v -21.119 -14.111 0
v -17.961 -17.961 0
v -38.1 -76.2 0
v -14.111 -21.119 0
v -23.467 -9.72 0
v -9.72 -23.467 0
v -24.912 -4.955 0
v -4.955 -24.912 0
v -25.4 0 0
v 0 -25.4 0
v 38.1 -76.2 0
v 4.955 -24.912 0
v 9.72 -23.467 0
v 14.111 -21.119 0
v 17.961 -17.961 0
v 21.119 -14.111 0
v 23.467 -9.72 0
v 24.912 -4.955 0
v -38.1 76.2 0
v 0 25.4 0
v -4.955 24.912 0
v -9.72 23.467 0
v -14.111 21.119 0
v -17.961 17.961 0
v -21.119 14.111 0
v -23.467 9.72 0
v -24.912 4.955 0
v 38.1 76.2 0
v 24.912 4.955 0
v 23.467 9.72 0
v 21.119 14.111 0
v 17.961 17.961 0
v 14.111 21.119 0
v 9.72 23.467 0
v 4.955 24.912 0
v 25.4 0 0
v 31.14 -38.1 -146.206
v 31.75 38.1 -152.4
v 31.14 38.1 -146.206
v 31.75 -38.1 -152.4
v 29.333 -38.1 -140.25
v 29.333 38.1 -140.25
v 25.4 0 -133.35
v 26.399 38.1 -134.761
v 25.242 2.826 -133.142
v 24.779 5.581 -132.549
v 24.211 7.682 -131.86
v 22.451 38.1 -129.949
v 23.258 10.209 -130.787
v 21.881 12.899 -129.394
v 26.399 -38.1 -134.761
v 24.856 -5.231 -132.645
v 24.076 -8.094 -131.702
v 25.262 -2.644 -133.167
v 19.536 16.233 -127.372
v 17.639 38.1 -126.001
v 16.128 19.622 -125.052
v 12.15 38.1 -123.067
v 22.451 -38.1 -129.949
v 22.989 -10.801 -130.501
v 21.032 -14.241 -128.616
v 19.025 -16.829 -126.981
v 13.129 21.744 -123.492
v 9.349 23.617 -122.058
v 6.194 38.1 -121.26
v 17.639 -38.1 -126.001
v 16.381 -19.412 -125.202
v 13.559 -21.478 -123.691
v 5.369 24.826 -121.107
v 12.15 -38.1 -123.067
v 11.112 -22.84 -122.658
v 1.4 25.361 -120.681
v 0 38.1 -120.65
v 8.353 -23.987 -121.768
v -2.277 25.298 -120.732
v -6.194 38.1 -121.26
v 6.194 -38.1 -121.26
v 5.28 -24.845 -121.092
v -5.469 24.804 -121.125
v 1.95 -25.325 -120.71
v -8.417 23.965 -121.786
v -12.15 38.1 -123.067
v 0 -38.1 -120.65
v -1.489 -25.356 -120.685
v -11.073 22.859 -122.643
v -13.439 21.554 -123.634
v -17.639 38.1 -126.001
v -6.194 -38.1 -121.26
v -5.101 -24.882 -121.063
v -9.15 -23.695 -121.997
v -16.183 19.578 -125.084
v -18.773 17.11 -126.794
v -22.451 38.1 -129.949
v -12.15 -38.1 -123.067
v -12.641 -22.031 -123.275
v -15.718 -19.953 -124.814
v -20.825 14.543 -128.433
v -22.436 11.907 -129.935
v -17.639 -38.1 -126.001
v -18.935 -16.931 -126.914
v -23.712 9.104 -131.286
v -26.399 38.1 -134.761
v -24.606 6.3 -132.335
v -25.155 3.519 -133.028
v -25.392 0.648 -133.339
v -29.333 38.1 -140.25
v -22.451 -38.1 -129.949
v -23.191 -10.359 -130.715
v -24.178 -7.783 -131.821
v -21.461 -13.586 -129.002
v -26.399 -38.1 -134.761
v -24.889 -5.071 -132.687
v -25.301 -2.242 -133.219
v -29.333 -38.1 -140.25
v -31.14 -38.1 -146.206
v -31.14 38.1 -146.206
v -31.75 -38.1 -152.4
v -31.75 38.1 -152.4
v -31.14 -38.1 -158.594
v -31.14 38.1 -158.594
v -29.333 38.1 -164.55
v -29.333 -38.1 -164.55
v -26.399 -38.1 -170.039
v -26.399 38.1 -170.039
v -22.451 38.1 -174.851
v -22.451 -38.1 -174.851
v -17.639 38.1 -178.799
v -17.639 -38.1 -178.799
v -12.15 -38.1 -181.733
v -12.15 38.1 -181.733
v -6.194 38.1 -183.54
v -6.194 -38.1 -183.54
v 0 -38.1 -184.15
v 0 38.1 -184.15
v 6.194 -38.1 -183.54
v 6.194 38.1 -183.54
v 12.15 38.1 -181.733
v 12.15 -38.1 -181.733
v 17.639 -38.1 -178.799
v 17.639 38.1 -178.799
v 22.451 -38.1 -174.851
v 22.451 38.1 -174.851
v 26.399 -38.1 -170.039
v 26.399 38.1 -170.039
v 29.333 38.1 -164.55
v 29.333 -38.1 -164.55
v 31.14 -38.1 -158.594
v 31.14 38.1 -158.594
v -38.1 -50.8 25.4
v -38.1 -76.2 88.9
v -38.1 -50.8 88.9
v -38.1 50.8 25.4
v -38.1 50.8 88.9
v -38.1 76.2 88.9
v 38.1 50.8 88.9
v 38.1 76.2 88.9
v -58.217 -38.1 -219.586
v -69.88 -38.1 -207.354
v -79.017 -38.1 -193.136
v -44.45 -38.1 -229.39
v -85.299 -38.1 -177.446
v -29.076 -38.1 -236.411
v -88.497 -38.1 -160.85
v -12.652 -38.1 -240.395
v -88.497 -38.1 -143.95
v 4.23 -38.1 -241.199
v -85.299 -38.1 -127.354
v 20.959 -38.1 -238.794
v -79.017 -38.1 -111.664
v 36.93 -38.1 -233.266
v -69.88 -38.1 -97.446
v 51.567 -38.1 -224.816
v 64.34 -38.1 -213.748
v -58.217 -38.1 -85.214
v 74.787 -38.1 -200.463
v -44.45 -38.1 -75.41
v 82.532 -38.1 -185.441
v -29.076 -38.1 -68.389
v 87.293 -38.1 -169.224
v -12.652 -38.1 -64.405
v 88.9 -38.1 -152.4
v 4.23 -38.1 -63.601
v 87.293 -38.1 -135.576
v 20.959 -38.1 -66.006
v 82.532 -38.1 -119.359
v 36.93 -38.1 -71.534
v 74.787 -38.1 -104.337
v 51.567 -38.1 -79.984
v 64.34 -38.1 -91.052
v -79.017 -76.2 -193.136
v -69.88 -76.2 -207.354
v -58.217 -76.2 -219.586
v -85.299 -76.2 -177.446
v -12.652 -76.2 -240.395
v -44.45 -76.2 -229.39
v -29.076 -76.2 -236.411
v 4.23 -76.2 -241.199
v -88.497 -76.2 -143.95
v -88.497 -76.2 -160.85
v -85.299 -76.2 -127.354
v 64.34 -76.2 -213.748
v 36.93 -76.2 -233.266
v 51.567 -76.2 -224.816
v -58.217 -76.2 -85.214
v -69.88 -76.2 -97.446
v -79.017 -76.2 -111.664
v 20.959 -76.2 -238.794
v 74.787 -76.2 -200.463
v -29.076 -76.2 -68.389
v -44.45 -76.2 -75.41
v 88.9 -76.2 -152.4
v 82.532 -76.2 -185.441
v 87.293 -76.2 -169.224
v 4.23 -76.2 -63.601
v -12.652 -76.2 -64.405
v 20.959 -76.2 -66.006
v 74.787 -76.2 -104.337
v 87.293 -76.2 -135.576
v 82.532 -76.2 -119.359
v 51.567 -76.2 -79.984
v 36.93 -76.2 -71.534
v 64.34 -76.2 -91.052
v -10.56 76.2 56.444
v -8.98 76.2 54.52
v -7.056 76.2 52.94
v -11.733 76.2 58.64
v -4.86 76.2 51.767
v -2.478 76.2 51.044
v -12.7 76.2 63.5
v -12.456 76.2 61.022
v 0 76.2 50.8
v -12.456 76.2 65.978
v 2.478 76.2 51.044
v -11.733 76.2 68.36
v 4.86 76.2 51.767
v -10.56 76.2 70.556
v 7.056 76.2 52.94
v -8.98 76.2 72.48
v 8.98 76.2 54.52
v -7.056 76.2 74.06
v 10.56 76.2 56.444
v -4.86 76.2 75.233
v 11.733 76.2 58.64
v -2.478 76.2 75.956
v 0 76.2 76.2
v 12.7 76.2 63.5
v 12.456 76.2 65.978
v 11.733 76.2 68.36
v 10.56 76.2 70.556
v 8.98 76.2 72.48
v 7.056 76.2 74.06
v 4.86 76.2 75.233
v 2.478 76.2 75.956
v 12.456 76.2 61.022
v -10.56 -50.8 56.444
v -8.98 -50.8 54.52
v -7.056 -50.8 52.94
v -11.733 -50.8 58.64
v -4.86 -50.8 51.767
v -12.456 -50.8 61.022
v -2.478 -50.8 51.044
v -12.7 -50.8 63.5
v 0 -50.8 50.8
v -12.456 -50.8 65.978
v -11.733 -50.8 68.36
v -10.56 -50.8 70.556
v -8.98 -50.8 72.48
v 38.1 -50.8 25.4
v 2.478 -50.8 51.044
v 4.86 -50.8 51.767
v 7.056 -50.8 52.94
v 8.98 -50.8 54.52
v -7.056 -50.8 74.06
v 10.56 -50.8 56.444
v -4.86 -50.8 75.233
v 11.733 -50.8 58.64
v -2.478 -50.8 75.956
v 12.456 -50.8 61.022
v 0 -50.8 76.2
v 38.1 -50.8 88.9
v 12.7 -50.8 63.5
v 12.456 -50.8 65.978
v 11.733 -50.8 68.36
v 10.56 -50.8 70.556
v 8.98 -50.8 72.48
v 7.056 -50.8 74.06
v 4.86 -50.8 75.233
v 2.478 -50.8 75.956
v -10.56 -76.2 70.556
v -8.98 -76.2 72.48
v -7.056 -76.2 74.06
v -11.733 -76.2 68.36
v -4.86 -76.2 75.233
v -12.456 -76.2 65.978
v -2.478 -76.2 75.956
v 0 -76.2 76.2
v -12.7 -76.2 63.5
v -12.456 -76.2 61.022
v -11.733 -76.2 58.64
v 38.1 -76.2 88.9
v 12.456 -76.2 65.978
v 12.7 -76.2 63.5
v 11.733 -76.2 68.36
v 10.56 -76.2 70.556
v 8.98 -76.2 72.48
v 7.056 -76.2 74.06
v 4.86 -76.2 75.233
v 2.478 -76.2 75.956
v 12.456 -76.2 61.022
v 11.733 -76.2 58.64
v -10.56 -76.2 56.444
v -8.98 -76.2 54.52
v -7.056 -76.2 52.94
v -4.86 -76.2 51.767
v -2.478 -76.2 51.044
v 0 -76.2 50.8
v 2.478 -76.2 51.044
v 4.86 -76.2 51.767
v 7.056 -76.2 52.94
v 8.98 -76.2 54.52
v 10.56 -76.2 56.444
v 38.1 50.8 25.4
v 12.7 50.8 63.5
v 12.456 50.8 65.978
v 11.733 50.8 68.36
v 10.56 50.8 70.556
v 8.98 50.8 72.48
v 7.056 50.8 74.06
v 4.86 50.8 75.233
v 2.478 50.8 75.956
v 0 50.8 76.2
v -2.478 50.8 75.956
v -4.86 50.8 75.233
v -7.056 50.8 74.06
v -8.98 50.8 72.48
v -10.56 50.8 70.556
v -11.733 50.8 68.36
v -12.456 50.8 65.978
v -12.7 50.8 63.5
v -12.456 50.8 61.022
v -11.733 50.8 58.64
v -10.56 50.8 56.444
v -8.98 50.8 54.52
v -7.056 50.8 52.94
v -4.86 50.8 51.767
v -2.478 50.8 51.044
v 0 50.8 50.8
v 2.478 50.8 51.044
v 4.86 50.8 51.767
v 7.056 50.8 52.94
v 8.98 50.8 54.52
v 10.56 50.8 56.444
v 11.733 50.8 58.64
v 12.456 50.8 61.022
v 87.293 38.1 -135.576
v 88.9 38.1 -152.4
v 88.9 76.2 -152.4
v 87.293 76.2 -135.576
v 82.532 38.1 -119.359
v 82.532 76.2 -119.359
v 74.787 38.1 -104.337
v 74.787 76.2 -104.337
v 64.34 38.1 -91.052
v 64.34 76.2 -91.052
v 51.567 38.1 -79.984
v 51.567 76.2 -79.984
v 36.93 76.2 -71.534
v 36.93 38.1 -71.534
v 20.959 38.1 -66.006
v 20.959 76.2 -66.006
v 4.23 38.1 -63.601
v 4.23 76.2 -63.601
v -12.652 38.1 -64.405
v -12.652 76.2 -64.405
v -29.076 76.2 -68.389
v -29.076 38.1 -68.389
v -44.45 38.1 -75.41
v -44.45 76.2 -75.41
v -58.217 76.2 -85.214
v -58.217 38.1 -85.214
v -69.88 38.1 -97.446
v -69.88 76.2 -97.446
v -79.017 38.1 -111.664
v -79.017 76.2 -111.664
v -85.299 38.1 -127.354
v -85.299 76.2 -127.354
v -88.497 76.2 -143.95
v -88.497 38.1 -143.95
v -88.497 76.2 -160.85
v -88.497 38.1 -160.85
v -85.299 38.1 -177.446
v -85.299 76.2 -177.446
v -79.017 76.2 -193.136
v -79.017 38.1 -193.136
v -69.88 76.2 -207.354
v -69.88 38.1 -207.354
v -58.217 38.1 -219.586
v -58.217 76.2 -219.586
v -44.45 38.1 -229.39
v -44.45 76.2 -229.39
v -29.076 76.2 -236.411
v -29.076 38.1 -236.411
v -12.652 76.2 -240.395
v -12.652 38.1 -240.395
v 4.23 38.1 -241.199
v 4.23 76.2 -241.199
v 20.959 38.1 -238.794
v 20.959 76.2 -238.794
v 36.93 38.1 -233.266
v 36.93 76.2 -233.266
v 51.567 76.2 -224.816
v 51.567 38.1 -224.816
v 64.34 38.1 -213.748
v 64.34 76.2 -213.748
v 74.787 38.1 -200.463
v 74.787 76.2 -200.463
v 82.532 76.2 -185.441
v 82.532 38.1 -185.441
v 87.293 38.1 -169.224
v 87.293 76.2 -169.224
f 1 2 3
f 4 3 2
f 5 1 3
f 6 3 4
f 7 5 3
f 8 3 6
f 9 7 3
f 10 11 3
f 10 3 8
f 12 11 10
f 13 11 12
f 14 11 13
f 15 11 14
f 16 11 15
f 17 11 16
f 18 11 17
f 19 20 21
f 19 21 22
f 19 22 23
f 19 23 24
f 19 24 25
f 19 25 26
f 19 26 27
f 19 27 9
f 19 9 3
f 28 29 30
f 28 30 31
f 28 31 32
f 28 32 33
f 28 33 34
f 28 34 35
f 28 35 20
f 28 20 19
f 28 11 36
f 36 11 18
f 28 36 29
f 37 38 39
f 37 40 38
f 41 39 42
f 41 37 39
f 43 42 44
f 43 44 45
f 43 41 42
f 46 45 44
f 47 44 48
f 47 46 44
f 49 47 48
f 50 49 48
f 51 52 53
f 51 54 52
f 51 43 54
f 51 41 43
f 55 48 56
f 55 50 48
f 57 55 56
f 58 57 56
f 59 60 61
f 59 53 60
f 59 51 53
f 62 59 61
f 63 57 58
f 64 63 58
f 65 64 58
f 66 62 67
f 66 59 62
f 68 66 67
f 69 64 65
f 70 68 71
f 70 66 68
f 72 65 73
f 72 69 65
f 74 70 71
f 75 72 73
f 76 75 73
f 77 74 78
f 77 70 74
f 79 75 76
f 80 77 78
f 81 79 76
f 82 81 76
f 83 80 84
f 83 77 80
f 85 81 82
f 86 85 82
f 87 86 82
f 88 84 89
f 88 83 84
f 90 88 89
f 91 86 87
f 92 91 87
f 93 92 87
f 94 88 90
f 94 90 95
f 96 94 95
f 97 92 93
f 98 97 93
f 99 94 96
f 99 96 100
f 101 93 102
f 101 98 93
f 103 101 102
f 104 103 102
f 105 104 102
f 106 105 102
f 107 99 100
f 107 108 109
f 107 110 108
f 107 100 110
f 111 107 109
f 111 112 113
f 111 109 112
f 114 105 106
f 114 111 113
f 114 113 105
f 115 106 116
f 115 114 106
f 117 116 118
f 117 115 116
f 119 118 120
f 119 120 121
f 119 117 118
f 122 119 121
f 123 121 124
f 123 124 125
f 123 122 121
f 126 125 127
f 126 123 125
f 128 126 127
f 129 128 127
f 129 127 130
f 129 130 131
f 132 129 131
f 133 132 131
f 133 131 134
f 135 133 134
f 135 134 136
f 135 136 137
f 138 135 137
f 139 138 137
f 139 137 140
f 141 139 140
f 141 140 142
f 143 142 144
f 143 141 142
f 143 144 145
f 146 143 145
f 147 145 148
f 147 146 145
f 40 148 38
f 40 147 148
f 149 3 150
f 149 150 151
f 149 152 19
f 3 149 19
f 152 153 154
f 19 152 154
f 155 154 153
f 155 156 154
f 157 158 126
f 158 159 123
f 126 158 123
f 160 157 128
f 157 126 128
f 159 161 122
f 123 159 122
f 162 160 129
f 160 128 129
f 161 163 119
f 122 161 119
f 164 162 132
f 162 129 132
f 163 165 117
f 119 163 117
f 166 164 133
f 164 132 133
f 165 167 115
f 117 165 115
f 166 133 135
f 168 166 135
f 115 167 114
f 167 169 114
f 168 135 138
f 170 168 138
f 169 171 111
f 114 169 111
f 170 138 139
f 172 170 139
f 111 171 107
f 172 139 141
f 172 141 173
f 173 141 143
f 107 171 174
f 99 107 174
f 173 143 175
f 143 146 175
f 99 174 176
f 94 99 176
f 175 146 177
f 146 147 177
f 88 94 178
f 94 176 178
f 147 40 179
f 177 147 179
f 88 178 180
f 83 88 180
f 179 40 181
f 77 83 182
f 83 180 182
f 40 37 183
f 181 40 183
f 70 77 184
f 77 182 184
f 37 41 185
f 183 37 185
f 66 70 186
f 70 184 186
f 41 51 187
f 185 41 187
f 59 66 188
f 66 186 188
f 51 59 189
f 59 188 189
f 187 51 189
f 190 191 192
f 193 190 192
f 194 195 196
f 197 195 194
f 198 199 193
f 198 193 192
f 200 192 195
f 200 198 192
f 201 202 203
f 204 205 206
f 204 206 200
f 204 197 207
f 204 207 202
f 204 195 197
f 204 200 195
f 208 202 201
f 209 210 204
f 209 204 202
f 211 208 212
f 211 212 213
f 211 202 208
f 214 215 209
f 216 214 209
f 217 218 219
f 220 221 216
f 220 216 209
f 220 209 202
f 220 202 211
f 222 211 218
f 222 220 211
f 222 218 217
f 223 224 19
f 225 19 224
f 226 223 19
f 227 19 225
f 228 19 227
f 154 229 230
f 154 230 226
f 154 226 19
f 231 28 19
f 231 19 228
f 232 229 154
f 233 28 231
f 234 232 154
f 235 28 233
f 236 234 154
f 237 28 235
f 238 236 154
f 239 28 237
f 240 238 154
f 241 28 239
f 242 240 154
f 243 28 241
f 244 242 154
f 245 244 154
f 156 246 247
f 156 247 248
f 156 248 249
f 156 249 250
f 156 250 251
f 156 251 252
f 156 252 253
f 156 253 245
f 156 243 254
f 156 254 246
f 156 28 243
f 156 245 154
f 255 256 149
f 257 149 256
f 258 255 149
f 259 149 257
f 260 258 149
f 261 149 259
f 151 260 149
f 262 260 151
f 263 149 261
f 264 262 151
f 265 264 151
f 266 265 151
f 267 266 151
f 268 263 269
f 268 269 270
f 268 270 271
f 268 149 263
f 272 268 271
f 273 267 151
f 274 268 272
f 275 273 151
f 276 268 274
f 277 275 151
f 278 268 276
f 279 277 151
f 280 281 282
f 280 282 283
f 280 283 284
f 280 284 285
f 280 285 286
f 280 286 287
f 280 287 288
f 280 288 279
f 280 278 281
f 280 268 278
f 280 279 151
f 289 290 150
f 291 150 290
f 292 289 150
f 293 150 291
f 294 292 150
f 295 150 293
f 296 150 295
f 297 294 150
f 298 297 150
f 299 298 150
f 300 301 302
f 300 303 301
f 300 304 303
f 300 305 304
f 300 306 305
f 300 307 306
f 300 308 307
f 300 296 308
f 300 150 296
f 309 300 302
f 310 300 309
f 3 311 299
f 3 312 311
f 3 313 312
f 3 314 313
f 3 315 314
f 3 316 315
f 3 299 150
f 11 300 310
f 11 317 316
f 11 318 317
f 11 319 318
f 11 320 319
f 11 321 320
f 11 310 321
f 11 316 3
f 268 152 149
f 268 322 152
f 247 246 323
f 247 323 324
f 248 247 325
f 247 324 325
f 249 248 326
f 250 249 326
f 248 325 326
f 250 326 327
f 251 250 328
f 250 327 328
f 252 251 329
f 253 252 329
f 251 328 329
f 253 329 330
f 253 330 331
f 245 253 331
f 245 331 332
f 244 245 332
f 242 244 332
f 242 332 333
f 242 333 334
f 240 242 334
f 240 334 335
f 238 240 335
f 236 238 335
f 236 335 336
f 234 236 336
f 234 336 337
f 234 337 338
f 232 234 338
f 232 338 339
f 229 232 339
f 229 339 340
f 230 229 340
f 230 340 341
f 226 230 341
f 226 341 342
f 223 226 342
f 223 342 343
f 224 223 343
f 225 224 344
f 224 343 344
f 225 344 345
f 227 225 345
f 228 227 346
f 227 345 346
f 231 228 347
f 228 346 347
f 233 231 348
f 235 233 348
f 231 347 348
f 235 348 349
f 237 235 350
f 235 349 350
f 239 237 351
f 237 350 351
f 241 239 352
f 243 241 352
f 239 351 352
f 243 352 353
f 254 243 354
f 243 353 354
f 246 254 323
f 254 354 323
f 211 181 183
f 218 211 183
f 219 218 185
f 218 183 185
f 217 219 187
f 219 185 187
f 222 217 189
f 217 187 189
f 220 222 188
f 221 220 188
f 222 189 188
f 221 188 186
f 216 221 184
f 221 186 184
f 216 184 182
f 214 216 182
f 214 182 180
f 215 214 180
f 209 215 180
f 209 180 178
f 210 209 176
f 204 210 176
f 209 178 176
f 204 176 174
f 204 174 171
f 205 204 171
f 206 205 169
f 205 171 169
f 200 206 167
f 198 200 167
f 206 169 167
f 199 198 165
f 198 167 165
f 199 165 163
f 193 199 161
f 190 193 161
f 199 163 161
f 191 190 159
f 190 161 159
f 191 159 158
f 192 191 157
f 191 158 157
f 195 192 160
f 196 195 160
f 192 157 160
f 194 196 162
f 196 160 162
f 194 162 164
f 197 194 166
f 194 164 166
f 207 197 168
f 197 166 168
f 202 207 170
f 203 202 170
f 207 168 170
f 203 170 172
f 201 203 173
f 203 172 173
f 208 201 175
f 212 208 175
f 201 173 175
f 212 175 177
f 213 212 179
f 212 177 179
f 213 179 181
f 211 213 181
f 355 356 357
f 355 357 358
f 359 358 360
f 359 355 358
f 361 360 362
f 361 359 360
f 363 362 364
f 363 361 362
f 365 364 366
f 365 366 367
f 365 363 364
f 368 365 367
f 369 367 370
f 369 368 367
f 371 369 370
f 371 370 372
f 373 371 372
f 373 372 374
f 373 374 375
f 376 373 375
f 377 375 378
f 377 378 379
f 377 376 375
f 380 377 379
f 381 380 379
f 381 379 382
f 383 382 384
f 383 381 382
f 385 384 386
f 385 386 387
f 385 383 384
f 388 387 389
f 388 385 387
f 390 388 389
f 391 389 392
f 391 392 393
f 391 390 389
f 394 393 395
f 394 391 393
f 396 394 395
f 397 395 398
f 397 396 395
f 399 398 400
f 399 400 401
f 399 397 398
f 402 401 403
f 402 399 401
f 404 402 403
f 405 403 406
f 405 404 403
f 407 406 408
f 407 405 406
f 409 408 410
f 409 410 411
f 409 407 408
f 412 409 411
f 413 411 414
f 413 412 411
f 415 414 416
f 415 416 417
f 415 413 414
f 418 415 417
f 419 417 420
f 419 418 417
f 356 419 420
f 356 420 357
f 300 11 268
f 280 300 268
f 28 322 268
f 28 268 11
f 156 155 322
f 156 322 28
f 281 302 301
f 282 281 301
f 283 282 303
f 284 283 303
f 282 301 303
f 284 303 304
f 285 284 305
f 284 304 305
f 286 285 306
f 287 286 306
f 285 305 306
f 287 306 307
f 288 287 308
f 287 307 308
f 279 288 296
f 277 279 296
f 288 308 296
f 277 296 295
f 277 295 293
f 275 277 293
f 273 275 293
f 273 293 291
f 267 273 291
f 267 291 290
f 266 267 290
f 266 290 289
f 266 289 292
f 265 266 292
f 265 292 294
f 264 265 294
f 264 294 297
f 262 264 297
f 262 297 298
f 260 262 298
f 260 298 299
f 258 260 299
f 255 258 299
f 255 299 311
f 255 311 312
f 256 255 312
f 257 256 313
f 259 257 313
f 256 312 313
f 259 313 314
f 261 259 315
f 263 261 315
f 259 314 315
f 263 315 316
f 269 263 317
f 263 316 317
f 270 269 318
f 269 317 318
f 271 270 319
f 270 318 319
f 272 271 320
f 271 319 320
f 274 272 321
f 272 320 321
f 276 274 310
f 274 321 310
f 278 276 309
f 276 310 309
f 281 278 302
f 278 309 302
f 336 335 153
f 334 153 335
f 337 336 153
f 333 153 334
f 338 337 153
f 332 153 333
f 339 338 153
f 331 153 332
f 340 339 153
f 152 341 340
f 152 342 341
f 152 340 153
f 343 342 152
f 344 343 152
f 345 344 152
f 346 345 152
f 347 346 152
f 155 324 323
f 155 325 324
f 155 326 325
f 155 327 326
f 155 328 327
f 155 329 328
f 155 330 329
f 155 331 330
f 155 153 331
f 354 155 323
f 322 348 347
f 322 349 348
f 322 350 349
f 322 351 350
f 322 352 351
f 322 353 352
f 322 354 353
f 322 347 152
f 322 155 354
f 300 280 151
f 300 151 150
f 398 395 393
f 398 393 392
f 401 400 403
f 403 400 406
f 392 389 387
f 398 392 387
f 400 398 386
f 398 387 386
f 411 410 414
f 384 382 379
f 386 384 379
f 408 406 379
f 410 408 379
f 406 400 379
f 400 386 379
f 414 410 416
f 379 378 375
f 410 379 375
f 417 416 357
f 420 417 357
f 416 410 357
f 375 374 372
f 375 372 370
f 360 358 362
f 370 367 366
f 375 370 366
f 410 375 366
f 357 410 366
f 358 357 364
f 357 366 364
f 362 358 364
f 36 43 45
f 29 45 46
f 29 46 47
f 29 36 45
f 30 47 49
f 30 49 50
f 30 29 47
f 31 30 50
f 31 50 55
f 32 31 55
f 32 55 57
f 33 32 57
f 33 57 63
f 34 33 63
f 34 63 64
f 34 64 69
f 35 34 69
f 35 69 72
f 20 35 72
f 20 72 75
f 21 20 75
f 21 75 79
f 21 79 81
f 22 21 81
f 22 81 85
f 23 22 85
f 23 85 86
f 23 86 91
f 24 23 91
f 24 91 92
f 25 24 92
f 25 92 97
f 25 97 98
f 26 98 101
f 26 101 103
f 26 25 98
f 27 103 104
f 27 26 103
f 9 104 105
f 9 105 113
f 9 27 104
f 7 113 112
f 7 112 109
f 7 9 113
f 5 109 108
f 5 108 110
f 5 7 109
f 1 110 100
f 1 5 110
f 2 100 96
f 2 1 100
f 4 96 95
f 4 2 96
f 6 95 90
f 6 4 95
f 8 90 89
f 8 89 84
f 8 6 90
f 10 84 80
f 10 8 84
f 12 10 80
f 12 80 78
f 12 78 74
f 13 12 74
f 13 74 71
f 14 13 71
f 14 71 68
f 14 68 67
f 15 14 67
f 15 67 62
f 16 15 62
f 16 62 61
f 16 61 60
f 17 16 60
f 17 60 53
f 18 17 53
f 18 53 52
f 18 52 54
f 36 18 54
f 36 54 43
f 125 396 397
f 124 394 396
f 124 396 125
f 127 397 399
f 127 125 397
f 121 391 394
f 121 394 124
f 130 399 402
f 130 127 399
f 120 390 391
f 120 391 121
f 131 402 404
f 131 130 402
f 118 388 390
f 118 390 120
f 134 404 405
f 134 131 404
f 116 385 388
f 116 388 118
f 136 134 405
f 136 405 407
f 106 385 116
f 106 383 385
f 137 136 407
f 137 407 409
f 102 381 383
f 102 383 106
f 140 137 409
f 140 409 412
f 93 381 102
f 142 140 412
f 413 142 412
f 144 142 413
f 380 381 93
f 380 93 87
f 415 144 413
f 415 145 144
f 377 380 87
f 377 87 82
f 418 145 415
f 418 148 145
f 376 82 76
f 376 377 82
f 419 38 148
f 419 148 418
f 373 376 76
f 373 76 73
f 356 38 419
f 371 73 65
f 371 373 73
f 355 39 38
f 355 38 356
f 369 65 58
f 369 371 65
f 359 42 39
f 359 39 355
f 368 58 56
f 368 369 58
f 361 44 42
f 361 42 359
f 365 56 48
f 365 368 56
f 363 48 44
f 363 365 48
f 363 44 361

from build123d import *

# Parameters (mm, degrees)
F0_R      = 25.4
F1_DEPTH  = 152.4
F3_DEPTH  = 38.1
F4_R      = 31.75
F5_DEPTH  = 38.1
F6_R      = 88.9
F7_DEPTH  = 38.1
F9_R      = 12.7
F10_DEPTH = 152.401


with BuildPart() as f1:
    # F0 (on Top) → F1 (new body)
    with BuildSketch(Plane.XY):
        Circle(F0_R)
    extrude(amount=-F1_DEPTH)

    # F2 (on Right) → F3 (join, symmetric)
    with BuildSketch(Plane.YZ):
        Polygon((50.8, 25.4), (0, 25.4), (-50.8, 25.4), (-50.8, 88.9), (-76.2, 88.9), (-76.2, 0), (0, 0), (76.2, 0), (76.2, 88.9), (50.8, 88.9), align=None)
    extrude(amount=F3_DEPTH, both=True)

    # F4 (on Front) → F5 (join, symmetric)
    with BuildSketch(Plane.XZ):
        with Locations((0, -152.4)):
            Circle(F4_R)
    extrude(amount=F5_DEPTH, both=True)

    # F6 (on face) → F7 (join)
    with BuildSketch(Plane.XZ.offset(38.1)):
        with Locations((0, -152.4)):
            Circle(F6_R)
    extrude(amount=F7_DEPTH)

    # F8: F1 across plane


with BuildPart() as f1_1:
    add(f1.part)
    add(f1.part.mirror(Plane.XZ))

    # F9 (on face) → F10 (cut, through all)
    with BuildSketch(Plane.XZ.offset(76.2)):
        with Locations((0, 63.5)):
            Circle(F9_R)
    extrude(amount=-F10_DEPTH, mode=Mode.SUBTRACT)


solid = f1_1.part
